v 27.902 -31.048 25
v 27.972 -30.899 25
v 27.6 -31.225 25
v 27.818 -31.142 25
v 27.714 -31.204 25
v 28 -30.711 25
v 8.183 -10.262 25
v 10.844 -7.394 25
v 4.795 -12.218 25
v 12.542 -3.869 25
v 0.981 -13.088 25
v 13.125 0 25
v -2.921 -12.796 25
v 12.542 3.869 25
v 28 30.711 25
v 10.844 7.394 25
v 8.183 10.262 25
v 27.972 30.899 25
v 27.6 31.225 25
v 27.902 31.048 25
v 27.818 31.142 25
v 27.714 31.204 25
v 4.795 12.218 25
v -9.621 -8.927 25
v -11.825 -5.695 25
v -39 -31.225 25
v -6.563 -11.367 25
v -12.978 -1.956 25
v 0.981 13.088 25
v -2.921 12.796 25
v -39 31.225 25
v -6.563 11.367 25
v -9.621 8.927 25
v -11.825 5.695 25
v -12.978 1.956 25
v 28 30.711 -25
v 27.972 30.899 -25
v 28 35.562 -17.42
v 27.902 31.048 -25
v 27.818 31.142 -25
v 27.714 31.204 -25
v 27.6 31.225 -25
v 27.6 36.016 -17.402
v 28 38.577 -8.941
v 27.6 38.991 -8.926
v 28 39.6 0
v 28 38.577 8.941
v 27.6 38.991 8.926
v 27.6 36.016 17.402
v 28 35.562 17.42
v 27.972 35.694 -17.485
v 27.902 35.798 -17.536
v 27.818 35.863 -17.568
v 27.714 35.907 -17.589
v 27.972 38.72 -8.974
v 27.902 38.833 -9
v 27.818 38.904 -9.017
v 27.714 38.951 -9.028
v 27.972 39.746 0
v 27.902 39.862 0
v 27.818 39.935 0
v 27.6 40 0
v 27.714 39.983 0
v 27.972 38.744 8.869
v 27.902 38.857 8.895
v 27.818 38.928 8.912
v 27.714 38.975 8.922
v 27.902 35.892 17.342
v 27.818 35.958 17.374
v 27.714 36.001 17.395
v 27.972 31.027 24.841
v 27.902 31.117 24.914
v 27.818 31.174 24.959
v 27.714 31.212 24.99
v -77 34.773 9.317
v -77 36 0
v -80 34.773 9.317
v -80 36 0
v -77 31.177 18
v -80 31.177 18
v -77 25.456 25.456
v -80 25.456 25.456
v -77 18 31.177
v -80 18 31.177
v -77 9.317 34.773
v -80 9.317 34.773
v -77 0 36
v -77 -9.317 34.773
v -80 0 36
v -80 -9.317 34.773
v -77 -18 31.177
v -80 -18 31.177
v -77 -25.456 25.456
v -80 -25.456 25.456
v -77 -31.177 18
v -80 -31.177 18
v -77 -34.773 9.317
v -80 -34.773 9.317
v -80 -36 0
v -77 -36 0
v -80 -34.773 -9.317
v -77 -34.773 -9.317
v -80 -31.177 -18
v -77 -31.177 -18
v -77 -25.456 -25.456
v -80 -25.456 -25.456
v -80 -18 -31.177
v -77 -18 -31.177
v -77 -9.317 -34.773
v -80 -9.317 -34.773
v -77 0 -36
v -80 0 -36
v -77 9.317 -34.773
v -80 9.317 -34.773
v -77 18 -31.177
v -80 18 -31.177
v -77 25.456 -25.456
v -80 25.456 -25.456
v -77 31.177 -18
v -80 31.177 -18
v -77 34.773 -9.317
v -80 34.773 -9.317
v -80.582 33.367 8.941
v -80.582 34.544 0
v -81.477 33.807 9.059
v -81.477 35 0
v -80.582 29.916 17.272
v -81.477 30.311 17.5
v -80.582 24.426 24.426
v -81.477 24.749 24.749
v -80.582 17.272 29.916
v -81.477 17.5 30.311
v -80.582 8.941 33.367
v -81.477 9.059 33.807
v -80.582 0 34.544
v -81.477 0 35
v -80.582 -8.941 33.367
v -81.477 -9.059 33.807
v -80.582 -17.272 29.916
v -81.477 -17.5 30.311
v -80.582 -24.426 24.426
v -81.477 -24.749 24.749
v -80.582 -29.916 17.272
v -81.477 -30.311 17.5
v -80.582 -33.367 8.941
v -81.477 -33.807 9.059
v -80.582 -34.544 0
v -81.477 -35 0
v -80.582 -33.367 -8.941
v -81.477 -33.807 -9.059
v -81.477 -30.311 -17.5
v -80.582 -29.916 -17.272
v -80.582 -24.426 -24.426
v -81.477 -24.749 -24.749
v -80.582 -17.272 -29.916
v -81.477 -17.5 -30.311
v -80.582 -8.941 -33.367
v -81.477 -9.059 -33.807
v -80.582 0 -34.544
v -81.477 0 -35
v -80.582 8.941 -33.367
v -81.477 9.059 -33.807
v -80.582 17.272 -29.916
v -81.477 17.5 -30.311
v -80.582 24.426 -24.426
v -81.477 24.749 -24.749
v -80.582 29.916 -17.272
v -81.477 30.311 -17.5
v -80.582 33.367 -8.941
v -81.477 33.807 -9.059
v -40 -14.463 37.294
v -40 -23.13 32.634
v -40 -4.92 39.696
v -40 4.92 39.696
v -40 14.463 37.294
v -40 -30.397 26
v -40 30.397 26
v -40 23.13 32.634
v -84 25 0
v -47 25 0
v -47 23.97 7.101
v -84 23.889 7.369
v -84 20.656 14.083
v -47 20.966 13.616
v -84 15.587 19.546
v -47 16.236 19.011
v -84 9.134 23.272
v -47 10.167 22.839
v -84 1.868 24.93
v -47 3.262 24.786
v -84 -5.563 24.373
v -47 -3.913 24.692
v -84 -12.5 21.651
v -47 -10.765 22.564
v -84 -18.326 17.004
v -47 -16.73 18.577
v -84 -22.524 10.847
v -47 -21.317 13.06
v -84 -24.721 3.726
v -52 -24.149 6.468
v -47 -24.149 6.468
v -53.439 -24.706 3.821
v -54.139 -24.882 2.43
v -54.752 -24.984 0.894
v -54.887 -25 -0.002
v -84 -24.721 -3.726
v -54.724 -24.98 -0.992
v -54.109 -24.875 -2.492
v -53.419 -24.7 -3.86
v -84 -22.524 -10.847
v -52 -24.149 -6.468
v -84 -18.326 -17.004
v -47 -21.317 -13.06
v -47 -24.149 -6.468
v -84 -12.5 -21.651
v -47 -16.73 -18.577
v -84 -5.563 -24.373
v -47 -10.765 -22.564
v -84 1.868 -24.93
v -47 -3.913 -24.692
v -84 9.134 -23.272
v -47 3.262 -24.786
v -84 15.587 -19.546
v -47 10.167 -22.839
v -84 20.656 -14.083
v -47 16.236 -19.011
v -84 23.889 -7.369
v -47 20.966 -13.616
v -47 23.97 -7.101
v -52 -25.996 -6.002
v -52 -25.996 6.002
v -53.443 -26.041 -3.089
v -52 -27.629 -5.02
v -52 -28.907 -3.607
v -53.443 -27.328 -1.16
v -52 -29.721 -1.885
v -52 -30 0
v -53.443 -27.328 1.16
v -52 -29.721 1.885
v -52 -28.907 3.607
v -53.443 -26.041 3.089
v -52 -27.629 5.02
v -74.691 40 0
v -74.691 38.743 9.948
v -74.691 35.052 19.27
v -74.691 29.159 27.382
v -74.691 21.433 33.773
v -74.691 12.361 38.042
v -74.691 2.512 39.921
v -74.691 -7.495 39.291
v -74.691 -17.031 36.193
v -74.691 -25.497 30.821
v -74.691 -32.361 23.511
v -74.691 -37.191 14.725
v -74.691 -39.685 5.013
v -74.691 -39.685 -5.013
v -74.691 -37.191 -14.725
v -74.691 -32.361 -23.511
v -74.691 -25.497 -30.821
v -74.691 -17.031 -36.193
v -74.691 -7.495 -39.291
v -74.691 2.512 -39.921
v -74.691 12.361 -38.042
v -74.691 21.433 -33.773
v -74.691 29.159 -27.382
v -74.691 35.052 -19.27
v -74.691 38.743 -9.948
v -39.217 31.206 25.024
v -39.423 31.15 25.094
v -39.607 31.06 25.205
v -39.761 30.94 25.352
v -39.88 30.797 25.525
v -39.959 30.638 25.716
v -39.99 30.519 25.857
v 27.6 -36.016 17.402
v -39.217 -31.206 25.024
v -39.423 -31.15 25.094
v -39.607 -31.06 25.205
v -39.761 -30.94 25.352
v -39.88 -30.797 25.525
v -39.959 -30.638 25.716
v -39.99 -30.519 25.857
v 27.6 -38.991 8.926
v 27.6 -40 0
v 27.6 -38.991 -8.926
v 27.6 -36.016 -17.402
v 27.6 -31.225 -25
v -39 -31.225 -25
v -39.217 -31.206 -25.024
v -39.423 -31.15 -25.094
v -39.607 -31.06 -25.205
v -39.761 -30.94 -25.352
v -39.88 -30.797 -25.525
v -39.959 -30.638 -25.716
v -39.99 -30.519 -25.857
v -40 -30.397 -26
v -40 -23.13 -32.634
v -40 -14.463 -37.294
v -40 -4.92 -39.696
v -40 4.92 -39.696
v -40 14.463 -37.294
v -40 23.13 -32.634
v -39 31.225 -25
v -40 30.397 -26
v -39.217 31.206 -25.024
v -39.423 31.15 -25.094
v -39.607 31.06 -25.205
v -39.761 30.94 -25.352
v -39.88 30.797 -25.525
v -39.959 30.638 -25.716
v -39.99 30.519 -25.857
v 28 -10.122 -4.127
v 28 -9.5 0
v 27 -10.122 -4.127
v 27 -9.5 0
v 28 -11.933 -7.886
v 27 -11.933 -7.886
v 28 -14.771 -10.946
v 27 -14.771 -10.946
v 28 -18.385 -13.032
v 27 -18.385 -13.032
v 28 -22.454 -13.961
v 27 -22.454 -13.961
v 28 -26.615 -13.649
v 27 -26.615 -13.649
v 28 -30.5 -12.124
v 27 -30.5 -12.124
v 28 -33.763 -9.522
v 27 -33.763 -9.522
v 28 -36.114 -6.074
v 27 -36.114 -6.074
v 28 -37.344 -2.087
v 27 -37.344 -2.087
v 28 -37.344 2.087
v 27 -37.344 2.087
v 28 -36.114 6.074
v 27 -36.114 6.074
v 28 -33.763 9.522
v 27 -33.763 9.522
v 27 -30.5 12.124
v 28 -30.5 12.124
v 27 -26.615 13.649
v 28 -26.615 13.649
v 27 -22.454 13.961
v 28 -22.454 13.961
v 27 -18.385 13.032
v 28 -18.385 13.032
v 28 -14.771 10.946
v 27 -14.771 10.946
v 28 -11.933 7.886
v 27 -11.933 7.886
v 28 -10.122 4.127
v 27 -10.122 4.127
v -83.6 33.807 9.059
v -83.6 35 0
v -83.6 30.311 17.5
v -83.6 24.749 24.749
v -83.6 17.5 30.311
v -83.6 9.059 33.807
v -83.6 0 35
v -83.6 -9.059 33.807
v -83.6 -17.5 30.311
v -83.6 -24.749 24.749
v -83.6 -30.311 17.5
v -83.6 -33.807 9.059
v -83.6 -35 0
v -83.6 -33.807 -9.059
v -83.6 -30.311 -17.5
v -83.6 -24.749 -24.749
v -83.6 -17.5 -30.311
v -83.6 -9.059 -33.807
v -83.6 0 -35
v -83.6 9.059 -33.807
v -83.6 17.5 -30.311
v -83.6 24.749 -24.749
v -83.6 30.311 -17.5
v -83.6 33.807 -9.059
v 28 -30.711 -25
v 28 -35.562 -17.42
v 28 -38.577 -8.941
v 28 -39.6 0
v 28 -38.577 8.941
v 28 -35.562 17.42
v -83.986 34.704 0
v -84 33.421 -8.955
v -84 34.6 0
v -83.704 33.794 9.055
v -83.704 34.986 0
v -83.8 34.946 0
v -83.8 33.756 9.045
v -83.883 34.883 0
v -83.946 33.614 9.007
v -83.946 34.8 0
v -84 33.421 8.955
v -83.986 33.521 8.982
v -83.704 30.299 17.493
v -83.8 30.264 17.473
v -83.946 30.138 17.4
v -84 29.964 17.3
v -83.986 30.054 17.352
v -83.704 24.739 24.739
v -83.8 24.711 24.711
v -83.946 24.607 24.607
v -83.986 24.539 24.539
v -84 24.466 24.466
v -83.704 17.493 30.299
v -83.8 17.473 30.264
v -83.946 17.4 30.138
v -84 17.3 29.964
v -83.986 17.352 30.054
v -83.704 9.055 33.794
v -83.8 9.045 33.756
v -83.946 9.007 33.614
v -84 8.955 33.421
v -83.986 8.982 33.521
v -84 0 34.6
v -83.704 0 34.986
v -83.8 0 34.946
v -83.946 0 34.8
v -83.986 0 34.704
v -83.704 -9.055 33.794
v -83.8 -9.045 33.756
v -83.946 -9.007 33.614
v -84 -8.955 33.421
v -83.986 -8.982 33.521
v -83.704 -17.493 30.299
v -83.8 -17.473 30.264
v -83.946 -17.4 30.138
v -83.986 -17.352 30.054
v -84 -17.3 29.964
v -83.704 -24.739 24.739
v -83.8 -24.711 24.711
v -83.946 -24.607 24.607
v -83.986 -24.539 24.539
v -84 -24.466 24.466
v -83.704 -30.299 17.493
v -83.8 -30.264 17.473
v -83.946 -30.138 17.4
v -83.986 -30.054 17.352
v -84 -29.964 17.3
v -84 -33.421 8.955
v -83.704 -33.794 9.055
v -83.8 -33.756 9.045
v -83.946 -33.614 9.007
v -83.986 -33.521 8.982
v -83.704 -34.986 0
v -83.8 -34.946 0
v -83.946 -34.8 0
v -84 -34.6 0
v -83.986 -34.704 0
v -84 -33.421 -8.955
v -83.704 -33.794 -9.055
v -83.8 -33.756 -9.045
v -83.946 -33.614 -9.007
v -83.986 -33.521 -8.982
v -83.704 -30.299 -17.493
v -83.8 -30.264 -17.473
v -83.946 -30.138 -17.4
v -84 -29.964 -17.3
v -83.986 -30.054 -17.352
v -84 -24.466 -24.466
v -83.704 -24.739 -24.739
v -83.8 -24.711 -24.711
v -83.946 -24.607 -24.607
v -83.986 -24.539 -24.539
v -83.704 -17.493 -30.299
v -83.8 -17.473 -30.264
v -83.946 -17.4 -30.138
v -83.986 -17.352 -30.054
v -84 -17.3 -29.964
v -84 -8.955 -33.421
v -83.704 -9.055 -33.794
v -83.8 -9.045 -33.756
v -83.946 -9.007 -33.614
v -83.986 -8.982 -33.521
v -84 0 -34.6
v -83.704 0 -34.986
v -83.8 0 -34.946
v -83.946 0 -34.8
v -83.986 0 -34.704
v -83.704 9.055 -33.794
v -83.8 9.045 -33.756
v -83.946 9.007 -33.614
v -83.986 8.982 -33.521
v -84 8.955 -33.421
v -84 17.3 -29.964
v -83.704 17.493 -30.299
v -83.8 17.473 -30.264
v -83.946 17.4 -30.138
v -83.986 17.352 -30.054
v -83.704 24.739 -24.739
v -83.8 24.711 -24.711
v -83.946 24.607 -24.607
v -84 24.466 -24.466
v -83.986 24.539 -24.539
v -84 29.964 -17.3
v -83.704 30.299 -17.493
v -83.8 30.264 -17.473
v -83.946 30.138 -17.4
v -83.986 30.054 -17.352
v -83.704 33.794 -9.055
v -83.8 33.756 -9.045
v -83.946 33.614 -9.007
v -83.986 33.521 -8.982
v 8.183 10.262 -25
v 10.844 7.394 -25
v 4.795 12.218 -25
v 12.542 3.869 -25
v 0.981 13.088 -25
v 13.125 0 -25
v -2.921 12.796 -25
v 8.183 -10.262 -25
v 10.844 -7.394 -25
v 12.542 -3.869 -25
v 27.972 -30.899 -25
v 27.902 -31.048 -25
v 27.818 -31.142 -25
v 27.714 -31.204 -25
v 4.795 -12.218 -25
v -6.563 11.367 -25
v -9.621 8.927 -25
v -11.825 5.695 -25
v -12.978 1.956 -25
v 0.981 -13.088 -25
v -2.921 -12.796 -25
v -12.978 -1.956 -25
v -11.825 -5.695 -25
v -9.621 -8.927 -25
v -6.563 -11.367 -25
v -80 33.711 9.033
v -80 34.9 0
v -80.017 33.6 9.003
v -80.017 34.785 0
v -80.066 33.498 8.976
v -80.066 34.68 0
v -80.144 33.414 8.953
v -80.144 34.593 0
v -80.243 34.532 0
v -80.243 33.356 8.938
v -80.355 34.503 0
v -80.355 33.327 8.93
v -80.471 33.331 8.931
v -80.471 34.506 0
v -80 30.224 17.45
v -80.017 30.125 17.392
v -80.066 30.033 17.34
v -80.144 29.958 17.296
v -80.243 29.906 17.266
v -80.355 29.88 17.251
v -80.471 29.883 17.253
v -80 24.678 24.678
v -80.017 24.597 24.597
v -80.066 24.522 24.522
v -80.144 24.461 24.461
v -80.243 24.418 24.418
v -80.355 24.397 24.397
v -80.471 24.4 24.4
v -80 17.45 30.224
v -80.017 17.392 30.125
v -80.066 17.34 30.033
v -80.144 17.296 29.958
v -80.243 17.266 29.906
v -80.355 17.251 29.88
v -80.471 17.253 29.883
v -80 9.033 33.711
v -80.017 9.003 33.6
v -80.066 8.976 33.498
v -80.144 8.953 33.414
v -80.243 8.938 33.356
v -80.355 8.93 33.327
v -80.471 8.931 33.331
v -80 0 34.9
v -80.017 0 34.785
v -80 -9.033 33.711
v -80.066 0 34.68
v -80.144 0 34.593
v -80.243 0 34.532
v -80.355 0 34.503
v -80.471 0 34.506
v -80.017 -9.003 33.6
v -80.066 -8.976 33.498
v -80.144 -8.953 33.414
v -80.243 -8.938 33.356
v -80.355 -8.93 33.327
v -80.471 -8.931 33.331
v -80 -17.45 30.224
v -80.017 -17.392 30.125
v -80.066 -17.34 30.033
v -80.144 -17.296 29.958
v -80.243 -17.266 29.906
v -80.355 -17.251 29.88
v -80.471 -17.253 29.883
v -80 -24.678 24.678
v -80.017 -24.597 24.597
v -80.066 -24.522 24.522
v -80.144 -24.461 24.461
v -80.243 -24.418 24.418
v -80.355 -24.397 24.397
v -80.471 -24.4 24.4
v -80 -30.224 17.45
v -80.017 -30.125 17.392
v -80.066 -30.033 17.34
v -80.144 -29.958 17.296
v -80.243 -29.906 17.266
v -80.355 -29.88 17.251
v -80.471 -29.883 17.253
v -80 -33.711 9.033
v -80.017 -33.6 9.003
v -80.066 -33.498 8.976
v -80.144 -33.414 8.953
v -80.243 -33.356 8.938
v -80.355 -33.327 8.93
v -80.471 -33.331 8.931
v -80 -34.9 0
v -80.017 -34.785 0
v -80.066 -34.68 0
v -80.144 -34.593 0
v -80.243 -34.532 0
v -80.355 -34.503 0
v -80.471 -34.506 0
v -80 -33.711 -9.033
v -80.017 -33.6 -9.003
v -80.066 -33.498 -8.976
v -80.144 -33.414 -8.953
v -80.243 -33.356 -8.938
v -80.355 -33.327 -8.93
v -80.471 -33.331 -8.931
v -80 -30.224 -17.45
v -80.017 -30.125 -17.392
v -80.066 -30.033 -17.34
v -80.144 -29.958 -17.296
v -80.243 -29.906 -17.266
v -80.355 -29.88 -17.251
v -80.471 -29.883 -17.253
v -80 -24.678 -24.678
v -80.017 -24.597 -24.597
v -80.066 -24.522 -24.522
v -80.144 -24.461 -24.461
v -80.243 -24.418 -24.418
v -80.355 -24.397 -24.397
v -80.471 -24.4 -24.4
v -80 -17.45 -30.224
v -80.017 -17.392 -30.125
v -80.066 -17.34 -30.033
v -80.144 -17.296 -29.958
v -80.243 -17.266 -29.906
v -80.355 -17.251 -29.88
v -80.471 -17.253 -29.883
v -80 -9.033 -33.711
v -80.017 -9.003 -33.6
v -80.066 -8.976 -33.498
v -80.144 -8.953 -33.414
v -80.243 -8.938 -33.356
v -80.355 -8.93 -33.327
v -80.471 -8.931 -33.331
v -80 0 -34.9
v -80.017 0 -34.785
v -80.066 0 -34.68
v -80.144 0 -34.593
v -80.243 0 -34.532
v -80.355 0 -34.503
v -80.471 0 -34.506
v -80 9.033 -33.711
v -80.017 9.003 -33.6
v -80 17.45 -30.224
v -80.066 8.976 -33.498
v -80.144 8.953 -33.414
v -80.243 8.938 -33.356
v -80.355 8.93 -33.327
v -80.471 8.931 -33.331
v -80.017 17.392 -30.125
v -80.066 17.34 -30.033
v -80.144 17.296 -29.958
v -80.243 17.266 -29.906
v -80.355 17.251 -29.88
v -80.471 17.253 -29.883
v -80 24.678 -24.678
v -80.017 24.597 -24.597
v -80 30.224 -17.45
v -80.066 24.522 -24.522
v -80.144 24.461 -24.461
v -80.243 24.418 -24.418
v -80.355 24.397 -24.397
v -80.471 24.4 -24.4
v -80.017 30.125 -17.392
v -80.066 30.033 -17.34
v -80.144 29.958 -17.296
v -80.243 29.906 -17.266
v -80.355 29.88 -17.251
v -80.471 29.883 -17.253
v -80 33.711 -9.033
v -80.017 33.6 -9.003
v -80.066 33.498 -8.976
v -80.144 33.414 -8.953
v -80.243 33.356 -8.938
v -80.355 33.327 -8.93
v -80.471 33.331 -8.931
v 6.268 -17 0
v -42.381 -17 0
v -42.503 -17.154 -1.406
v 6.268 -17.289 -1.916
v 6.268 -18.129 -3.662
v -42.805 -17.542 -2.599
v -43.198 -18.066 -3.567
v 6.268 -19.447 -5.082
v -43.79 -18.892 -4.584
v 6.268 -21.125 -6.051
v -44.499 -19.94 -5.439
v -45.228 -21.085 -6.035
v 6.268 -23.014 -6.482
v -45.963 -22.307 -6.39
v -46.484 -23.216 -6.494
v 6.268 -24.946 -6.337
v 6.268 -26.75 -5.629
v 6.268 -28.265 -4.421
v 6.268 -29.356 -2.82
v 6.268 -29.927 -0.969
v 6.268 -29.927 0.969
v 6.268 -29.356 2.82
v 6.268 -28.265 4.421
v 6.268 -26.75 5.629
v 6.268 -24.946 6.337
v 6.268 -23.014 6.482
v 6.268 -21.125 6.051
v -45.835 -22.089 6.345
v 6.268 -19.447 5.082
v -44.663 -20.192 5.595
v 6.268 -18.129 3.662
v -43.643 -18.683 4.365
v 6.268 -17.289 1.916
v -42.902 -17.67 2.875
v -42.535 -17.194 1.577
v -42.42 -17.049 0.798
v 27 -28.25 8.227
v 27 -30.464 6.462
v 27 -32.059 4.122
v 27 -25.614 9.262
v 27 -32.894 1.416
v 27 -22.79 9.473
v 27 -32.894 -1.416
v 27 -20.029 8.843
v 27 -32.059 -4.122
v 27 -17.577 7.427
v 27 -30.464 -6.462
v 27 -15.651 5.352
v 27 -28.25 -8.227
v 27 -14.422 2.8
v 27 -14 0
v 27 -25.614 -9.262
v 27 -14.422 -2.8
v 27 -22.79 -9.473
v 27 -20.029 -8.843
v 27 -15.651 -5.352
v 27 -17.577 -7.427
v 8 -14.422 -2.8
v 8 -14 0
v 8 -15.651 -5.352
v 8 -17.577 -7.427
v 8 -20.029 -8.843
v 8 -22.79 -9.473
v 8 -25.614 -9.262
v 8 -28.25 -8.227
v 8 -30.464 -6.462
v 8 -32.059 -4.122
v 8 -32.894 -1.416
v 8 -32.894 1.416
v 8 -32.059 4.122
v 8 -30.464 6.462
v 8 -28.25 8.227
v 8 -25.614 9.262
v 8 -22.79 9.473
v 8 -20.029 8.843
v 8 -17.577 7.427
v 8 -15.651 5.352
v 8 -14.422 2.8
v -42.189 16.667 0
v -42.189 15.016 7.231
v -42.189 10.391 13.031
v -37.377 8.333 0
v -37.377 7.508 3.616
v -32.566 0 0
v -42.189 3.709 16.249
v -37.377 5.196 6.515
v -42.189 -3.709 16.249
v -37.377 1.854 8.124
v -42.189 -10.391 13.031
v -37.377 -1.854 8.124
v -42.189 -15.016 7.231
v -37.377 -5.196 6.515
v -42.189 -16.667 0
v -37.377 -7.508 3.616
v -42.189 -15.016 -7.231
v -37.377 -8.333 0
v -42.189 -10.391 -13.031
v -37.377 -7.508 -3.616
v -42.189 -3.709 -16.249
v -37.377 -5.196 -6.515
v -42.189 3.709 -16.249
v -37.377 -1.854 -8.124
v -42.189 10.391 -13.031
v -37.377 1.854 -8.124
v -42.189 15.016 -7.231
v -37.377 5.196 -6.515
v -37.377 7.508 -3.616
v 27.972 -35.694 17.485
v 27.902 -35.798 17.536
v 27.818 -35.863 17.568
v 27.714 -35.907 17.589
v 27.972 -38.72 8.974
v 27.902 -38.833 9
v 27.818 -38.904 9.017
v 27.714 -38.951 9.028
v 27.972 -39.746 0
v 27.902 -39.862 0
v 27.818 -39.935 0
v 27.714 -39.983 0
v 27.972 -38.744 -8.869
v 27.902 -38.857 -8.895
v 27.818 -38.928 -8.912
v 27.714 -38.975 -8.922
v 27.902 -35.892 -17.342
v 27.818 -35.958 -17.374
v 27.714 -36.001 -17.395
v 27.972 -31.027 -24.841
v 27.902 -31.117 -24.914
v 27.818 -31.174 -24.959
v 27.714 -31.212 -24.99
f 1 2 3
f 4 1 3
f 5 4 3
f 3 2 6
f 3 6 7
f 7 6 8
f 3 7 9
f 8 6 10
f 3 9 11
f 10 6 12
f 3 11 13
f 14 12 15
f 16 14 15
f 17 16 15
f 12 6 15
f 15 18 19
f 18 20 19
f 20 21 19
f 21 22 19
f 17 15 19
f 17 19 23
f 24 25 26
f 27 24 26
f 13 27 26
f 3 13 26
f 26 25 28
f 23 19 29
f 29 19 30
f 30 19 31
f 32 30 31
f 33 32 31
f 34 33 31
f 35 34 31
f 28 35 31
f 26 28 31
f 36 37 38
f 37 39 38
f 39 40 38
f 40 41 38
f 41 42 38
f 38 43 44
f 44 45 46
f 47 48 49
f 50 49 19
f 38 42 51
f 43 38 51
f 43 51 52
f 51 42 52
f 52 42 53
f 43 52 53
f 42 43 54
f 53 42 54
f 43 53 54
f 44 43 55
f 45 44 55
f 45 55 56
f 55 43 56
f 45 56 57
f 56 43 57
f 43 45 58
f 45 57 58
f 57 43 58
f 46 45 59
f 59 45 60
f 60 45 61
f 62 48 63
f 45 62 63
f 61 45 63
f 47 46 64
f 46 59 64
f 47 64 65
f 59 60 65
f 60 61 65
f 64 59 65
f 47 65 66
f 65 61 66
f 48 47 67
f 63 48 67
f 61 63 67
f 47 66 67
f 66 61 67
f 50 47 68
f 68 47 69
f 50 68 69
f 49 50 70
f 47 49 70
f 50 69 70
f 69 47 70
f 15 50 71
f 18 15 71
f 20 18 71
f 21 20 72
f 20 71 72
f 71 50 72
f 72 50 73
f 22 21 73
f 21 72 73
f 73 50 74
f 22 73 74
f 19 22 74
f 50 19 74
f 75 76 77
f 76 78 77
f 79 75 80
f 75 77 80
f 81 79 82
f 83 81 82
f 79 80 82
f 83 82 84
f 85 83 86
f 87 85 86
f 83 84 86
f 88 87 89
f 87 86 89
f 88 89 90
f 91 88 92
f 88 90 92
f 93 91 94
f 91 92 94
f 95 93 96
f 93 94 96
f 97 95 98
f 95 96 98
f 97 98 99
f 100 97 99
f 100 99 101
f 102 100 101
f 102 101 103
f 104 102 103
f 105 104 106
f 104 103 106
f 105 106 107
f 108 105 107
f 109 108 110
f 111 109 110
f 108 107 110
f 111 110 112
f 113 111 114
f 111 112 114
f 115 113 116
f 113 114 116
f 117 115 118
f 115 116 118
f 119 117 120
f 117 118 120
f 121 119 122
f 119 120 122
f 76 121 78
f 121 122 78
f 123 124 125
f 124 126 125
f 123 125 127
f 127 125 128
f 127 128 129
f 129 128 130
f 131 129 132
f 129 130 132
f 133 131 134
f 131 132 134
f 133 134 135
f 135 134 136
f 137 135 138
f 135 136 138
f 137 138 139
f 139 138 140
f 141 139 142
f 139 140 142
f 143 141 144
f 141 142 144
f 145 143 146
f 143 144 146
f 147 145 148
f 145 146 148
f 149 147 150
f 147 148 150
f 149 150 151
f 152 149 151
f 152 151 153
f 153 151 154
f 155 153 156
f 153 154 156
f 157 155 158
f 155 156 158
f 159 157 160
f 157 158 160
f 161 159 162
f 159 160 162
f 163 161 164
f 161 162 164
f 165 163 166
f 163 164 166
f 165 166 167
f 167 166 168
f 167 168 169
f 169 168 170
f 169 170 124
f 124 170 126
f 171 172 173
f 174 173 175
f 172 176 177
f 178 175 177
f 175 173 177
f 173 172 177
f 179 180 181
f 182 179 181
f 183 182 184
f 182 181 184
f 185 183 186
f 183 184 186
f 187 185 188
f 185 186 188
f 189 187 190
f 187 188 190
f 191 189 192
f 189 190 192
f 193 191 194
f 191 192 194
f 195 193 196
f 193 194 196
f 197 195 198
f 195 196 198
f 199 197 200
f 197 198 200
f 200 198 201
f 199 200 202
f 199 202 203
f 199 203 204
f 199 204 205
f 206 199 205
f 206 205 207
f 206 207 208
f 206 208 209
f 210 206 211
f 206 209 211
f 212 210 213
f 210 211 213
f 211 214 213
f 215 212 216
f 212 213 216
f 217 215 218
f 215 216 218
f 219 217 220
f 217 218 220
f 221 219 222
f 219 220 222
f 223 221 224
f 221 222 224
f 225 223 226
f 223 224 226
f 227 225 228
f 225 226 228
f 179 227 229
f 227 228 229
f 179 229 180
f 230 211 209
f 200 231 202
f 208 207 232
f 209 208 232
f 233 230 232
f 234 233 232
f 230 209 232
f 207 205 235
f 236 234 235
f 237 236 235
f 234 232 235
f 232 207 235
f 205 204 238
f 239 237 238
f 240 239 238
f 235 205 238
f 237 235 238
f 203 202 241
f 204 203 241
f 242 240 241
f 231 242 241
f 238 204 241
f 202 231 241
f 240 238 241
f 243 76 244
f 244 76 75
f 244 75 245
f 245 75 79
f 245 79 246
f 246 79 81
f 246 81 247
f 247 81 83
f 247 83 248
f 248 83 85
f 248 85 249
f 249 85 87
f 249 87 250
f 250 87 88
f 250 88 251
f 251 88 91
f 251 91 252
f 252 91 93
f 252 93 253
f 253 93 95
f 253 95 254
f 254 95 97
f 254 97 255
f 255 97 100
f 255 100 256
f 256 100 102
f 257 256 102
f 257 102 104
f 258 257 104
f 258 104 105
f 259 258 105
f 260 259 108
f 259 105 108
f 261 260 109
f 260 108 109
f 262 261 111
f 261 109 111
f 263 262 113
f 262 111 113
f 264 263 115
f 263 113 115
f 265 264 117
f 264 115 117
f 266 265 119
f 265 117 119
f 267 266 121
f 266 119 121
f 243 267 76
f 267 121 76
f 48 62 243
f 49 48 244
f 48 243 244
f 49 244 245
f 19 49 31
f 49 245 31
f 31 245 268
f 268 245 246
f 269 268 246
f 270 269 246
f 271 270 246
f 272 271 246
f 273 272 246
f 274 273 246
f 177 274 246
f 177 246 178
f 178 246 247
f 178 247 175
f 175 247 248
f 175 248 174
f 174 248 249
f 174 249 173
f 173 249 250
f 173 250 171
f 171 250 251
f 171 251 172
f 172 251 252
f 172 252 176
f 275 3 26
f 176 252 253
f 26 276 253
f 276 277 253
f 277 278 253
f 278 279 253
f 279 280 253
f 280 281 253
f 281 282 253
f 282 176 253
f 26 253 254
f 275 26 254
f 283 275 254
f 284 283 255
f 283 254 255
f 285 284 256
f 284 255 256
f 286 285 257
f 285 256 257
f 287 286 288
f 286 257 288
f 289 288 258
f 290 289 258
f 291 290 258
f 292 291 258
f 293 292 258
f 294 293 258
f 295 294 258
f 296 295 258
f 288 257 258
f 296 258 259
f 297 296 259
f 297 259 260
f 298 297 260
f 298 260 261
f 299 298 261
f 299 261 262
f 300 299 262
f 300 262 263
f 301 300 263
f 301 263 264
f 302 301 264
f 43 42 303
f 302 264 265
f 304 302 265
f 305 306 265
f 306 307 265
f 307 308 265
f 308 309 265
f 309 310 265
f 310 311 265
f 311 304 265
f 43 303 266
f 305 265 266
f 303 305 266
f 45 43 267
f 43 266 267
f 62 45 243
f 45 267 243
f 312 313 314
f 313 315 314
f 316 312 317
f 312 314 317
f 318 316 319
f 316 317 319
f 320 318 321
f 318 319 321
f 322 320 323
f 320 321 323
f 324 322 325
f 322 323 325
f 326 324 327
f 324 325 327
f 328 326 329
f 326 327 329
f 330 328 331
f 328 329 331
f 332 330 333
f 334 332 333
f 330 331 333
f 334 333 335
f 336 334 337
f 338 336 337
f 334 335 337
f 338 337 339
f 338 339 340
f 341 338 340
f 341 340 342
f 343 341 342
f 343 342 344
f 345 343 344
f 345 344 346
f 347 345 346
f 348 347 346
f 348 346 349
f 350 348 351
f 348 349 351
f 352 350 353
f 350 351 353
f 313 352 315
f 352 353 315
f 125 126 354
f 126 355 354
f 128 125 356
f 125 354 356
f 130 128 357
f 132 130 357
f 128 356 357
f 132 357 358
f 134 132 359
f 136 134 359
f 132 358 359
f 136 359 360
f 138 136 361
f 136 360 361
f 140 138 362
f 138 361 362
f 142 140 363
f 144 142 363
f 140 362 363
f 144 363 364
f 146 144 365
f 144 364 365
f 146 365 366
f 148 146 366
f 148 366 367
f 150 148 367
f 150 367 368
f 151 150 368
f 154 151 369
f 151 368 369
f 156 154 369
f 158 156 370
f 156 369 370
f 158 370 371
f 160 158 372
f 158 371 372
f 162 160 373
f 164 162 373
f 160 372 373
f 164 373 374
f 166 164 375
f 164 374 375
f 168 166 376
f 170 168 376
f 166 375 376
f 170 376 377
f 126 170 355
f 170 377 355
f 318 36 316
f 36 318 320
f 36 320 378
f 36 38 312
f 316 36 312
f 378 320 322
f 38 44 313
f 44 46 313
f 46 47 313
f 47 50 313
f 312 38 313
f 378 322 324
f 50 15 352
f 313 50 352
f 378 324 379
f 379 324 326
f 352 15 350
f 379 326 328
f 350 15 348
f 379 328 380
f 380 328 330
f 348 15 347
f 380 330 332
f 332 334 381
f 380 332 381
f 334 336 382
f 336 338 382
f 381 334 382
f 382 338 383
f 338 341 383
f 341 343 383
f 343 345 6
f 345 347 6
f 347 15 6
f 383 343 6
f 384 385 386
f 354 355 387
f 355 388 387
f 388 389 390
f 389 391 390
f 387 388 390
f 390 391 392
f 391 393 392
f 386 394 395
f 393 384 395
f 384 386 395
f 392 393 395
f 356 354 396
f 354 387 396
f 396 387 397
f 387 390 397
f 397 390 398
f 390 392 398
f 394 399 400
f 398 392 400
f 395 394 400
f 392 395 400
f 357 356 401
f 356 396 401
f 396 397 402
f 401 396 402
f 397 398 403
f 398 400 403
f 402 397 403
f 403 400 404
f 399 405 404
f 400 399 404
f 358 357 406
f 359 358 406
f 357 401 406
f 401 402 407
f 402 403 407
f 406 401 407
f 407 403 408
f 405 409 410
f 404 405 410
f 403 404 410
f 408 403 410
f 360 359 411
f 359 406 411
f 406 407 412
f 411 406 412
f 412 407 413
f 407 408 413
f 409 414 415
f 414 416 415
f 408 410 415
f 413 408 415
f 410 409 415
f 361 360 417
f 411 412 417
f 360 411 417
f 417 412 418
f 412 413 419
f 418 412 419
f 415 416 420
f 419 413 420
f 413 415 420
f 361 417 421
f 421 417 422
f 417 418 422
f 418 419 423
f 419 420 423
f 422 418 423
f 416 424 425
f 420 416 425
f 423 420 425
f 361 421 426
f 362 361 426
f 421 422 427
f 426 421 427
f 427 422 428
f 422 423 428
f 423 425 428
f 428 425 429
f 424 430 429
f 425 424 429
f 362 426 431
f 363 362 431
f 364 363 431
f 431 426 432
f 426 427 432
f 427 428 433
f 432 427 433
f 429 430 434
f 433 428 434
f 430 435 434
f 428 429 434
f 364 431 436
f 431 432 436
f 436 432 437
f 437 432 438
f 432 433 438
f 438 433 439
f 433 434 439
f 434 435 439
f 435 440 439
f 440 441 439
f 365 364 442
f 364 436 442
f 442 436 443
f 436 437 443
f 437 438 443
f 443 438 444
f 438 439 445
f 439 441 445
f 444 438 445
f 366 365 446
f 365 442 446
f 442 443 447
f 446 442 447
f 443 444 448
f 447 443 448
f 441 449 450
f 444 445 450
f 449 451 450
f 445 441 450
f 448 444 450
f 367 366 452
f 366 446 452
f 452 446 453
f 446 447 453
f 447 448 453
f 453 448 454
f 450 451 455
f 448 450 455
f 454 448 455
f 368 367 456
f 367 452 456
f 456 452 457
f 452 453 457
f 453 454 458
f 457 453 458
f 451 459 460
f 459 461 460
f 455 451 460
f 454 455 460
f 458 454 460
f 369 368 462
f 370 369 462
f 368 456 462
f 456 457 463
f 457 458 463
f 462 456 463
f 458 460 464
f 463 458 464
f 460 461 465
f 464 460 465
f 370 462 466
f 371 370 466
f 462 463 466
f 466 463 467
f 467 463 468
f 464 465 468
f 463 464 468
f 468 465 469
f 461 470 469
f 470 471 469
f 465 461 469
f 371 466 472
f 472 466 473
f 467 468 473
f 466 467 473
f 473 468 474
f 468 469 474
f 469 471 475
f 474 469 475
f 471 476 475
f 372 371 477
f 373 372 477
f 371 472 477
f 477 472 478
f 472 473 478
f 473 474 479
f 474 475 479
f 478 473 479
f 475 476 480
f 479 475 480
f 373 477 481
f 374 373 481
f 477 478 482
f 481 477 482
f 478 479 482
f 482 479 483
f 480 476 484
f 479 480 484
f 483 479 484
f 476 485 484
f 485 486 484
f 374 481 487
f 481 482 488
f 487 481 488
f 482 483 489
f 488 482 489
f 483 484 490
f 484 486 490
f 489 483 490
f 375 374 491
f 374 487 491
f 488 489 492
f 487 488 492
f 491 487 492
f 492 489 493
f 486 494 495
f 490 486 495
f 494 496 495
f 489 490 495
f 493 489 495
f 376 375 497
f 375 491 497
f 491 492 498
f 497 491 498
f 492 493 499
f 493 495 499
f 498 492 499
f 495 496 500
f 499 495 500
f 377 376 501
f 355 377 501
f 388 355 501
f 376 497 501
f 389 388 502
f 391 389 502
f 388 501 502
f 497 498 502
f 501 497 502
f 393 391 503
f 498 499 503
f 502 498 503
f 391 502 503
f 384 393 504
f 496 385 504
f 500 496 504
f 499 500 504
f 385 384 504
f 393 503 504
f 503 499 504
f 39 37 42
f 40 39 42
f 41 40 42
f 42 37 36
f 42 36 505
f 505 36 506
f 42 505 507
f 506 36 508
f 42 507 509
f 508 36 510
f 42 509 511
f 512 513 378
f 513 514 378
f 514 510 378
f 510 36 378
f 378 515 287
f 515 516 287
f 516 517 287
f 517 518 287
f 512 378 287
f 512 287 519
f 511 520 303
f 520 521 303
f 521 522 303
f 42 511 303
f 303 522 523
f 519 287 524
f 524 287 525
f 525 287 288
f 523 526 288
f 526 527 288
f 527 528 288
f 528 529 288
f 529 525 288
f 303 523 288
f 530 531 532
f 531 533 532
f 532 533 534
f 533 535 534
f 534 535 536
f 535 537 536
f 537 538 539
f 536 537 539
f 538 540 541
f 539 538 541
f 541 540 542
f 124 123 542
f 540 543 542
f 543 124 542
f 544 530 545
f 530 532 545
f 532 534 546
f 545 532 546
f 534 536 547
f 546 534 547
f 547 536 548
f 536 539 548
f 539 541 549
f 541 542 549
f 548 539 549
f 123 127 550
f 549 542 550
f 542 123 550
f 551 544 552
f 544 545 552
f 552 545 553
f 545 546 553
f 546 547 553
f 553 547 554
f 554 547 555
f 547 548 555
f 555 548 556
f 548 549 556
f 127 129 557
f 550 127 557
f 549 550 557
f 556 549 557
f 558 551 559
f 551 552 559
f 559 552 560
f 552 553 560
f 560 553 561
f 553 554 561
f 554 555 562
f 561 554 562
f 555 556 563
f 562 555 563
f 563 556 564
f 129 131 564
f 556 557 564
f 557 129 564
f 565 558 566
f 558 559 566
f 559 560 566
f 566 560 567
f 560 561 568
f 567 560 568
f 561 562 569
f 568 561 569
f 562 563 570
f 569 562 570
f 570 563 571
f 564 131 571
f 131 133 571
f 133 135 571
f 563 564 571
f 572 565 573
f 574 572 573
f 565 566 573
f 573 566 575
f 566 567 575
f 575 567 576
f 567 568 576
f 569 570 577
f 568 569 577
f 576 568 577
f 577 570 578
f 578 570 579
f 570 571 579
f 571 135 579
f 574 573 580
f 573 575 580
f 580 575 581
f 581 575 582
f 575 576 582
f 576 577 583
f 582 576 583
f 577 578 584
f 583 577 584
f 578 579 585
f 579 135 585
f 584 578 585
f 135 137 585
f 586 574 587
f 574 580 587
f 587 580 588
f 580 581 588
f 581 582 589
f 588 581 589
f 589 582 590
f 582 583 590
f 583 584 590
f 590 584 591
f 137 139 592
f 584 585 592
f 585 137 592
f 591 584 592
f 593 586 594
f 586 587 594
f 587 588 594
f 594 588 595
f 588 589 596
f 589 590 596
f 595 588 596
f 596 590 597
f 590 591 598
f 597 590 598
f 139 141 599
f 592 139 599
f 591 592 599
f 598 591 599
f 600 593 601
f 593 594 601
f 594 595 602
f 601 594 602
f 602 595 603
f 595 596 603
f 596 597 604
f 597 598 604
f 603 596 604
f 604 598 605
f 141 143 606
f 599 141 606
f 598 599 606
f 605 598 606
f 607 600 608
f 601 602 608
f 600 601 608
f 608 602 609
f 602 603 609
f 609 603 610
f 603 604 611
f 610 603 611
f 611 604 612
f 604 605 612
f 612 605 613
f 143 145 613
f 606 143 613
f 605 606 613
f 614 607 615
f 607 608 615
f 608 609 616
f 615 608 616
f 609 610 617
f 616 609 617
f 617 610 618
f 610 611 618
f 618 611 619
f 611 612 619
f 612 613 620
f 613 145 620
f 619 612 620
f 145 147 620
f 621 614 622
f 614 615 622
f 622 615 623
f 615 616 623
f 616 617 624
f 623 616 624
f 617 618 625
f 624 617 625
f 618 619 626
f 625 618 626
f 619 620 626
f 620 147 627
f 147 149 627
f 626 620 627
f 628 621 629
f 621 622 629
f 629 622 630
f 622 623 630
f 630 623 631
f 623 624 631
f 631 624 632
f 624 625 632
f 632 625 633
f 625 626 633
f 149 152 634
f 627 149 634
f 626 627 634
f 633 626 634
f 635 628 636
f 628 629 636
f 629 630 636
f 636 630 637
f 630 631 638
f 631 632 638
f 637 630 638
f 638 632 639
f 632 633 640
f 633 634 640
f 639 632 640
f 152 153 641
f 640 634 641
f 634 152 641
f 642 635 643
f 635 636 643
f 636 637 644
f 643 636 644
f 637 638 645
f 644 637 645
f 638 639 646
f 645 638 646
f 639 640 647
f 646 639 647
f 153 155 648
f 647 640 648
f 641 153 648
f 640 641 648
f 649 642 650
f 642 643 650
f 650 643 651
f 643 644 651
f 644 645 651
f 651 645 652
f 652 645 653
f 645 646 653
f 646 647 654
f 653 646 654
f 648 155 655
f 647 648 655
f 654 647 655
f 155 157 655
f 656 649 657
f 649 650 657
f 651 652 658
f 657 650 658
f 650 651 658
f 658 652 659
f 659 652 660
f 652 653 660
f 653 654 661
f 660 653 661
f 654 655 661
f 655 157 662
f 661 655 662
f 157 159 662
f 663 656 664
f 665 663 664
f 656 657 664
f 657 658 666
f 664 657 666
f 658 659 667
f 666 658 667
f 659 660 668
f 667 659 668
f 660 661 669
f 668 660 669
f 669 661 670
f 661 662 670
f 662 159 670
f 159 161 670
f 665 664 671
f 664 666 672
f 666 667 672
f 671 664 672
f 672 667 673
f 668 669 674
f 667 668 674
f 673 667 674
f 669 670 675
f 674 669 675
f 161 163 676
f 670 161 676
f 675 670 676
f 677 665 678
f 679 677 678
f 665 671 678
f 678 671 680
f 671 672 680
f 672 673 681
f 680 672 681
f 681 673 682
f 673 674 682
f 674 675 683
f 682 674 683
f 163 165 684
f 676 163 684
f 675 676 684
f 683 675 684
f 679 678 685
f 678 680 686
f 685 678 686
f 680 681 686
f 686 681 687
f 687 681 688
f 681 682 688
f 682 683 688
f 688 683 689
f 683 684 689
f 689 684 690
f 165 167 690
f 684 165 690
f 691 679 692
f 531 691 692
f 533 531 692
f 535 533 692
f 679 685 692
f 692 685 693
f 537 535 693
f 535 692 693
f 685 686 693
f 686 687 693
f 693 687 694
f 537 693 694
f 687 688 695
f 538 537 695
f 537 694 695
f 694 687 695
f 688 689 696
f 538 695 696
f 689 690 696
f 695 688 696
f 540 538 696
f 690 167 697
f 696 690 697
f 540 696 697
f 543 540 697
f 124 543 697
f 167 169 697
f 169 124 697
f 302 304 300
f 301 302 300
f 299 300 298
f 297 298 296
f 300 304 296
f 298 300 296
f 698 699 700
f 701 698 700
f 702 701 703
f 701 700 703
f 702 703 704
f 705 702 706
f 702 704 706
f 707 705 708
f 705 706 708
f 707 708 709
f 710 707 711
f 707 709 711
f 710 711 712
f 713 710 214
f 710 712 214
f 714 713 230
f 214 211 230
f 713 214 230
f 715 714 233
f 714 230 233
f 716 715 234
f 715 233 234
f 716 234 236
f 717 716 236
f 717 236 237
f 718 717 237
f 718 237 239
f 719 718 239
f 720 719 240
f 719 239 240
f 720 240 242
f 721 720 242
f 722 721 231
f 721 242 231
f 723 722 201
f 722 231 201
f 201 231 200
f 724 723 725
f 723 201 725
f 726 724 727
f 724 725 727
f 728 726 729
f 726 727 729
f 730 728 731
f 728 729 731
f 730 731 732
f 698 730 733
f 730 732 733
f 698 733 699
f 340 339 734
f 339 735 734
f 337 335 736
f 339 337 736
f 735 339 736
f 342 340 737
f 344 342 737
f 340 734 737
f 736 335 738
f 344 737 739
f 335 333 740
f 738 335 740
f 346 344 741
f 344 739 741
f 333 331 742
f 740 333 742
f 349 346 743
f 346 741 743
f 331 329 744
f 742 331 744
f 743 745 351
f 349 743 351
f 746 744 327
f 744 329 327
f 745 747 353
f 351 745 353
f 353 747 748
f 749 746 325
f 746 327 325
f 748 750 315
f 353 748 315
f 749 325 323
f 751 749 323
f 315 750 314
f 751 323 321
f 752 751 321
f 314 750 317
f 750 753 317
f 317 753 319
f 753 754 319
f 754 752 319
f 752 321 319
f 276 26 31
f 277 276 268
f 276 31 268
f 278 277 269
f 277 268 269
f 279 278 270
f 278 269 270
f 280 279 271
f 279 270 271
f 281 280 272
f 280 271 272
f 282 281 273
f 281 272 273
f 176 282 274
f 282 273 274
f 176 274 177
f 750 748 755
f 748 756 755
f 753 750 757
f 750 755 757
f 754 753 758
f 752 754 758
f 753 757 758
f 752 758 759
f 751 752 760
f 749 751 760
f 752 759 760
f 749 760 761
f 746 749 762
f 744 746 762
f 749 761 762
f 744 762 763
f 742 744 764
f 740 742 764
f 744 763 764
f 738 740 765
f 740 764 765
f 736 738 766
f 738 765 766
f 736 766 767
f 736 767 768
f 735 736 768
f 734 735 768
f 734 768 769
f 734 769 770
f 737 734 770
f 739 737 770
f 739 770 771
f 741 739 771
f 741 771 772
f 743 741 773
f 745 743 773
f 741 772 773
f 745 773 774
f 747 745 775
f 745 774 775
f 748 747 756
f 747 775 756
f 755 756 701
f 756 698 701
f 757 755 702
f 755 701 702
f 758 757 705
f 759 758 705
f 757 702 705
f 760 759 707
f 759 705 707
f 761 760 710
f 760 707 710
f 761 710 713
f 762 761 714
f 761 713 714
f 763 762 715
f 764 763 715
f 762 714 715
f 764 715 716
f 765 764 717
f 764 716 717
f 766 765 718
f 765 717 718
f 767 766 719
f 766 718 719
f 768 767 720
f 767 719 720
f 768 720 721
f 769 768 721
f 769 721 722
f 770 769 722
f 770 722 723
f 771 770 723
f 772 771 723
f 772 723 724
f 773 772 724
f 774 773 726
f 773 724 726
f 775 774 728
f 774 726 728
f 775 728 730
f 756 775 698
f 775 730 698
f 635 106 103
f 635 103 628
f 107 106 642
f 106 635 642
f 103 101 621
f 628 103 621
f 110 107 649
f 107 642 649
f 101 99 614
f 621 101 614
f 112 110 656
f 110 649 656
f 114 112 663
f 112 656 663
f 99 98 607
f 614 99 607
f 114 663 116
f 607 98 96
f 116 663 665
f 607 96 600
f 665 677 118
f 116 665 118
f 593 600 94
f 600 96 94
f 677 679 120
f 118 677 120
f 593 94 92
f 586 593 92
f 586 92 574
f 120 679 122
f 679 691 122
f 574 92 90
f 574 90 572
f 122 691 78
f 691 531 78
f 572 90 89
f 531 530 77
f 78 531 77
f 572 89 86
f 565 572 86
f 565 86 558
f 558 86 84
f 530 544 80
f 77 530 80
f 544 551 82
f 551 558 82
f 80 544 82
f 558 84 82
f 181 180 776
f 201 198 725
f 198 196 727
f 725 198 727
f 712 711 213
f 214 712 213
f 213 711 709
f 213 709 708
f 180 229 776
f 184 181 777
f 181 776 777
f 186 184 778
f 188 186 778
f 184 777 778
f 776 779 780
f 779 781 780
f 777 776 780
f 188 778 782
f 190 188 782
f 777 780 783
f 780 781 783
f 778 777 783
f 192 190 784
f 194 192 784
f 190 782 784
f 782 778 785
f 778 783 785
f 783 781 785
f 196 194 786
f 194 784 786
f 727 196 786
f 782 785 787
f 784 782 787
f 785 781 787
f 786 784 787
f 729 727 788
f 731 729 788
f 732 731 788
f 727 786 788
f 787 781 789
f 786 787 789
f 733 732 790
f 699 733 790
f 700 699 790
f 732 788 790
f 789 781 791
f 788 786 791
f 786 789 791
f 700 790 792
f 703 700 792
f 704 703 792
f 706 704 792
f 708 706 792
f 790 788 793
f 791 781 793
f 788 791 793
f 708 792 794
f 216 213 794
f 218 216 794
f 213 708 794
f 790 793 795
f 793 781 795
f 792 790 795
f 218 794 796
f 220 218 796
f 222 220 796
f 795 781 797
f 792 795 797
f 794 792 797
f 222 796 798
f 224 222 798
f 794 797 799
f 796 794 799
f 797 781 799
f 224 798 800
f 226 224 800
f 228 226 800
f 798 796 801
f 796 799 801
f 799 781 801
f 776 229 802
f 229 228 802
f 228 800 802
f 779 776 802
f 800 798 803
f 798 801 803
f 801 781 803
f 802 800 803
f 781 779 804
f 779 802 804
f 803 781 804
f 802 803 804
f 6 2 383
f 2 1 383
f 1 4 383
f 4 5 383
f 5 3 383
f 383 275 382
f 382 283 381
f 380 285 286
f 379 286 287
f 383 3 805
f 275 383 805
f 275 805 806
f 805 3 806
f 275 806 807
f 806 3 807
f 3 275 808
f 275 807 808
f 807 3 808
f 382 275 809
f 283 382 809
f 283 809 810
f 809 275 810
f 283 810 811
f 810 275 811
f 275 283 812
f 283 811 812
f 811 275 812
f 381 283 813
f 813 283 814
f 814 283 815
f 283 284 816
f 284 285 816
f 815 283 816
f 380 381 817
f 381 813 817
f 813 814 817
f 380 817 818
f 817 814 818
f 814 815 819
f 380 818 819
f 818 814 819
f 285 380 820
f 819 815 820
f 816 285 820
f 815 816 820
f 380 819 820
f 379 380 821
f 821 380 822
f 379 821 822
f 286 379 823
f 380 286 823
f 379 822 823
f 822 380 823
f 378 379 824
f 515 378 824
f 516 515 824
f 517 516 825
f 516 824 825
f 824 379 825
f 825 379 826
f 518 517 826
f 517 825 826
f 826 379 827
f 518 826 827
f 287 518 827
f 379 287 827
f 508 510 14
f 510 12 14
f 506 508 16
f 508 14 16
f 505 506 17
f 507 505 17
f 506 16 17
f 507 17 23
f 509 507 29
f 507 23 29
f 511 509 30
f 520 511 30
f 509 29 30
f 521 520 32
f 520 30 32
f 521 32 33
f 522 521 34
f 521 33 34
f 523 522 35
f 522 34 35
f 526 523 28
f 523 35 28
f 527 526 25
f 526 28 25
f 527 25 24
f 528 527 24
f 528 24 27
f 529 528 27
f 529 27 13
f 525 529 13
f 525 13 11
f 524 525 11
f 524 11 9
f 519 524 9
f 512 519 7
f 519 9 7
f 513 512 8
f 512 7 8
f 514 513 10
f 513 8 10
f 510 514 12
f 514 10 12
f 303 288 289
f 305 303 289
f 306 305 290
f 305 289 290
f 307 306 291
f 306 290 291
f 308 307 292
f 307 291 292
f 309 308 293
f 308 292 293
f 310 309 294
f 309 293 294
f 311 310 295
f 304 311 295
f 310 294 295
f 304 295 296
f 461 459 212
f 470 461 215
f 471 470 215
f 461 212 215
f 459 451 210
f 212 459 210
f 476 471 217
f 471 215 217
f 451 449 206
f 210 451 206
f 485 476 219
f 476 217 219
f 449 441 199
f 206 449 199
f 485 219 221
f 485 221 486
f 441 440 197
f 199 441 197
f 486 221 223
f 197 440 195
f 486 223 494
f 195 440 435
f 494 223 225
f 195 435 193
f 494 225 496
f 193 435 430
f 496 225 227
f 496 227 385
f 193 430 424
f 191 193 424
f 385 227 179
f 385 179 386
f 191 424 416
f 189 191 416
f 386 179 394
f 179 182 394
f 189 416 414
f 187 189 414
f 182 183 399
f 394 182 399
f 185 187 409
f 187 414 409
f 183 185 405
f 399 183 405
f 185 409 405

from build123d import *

# Parameters (mm, degrees)
SKETCH2_R            = 13.125
F_26_25_MM_HUL_DEPTH = 50
CUT_EXTRUDE1_DEPTH   = 50


with BuildPart() as part:
    # Sketch1 → Base-Revolve (revolve)
    with BuildSketch(Plane.XY):
        with BuildLine():
            Line((28, 0), (28, 39.6))
            ThreePointArc((28, 39.6), (27.882842712, 39.882842712), (27.6, 40))
            Line((27.6, 40), (-74.690598923, 40))
            Line((-74.690598923, 40), (-77, 36))
            Line((-77, 36), (-80, 36))
            Line((-80, 36), (-80, 34.9))
            ThreePointArc((-80, 34.9), (-80.191000574, 34.558943934), (-80.5815962, 34.54359739))
            Line((-80.5815962, 34.54359739), (-81.477336756, 35))
            Line((-81.477336756, 35), (-83.6, 35))
            ThreePointArc((-83.6, 35), (-83.882842712, 34.882842712), (-84, 34.6))
            Line((-84, 34.6), (-84, 25))
            Line((-84, 25), (-47, 25))
            Line((-47, 25), (-32.56624327, 0))
            Line((-32.56624327, 0), (28, 0))
        make_face()
    revolve(axis=Axis((-90.573458716, 0, 0), (1, 0, 0)))

    # Sketch2 → ø26.25 mm hul (cut, symmetric)
    with BuildSketch(Plane.XY):
        Circle(SKETCH2_R)
    extrude(amount=F_26_25_MM_HUL_DEPTH, both=True, mode=Mode.SUBTRACT)

    # Sketch3 → Cut-Extrude1 (cut, symmetric)
    with BuildSketch(Plane(origin=(0, 0, 0), x_dir=(1, 0, 0), z_dir=(0, 1, 0))):
        with BuildLine():
            Line((28, 25), (-39, 25))
            ThreePointArc((-39, 25), (-39.707106781, 25.292893219), (-40, 26))
            Line((-40, 26), (-40, 40))
            Line((-40, 40), (28, 40))
            Line((28, 40), (28, 25))
        make_face()
        with BuildLine():
            Line((-40, -26), (-40, -40))
            Line((-40, -40), (28, -40))
            Line((28, -40), (28, -25))
            Line((28, -25), (-39, -25))
            ThreePointArc((-39, -25), (-39.707106781, -25.292893219), (-40, -26))
        make_face()
    extrude(amount=CUT_EXTRUDE1_DEPTH, both=True, mode=Mode.SUBTRACT)

    # Sketch4 → Cut-Revolve1 (revolve, cut)
    with BuildSketch(Plane.XY):
        Polygon((28, -9.5), (27, -9.5), (27, -14), (8, -14), (6.267949192, -17), (-52, -17), (-55.75277675, -23.5), (28, -23.5), align=None)
    revolve(axis=Axis((28, -23.5, 0), (-1, 0, 0)), mode=Mode.SUBTRACT)


solid = part.part
